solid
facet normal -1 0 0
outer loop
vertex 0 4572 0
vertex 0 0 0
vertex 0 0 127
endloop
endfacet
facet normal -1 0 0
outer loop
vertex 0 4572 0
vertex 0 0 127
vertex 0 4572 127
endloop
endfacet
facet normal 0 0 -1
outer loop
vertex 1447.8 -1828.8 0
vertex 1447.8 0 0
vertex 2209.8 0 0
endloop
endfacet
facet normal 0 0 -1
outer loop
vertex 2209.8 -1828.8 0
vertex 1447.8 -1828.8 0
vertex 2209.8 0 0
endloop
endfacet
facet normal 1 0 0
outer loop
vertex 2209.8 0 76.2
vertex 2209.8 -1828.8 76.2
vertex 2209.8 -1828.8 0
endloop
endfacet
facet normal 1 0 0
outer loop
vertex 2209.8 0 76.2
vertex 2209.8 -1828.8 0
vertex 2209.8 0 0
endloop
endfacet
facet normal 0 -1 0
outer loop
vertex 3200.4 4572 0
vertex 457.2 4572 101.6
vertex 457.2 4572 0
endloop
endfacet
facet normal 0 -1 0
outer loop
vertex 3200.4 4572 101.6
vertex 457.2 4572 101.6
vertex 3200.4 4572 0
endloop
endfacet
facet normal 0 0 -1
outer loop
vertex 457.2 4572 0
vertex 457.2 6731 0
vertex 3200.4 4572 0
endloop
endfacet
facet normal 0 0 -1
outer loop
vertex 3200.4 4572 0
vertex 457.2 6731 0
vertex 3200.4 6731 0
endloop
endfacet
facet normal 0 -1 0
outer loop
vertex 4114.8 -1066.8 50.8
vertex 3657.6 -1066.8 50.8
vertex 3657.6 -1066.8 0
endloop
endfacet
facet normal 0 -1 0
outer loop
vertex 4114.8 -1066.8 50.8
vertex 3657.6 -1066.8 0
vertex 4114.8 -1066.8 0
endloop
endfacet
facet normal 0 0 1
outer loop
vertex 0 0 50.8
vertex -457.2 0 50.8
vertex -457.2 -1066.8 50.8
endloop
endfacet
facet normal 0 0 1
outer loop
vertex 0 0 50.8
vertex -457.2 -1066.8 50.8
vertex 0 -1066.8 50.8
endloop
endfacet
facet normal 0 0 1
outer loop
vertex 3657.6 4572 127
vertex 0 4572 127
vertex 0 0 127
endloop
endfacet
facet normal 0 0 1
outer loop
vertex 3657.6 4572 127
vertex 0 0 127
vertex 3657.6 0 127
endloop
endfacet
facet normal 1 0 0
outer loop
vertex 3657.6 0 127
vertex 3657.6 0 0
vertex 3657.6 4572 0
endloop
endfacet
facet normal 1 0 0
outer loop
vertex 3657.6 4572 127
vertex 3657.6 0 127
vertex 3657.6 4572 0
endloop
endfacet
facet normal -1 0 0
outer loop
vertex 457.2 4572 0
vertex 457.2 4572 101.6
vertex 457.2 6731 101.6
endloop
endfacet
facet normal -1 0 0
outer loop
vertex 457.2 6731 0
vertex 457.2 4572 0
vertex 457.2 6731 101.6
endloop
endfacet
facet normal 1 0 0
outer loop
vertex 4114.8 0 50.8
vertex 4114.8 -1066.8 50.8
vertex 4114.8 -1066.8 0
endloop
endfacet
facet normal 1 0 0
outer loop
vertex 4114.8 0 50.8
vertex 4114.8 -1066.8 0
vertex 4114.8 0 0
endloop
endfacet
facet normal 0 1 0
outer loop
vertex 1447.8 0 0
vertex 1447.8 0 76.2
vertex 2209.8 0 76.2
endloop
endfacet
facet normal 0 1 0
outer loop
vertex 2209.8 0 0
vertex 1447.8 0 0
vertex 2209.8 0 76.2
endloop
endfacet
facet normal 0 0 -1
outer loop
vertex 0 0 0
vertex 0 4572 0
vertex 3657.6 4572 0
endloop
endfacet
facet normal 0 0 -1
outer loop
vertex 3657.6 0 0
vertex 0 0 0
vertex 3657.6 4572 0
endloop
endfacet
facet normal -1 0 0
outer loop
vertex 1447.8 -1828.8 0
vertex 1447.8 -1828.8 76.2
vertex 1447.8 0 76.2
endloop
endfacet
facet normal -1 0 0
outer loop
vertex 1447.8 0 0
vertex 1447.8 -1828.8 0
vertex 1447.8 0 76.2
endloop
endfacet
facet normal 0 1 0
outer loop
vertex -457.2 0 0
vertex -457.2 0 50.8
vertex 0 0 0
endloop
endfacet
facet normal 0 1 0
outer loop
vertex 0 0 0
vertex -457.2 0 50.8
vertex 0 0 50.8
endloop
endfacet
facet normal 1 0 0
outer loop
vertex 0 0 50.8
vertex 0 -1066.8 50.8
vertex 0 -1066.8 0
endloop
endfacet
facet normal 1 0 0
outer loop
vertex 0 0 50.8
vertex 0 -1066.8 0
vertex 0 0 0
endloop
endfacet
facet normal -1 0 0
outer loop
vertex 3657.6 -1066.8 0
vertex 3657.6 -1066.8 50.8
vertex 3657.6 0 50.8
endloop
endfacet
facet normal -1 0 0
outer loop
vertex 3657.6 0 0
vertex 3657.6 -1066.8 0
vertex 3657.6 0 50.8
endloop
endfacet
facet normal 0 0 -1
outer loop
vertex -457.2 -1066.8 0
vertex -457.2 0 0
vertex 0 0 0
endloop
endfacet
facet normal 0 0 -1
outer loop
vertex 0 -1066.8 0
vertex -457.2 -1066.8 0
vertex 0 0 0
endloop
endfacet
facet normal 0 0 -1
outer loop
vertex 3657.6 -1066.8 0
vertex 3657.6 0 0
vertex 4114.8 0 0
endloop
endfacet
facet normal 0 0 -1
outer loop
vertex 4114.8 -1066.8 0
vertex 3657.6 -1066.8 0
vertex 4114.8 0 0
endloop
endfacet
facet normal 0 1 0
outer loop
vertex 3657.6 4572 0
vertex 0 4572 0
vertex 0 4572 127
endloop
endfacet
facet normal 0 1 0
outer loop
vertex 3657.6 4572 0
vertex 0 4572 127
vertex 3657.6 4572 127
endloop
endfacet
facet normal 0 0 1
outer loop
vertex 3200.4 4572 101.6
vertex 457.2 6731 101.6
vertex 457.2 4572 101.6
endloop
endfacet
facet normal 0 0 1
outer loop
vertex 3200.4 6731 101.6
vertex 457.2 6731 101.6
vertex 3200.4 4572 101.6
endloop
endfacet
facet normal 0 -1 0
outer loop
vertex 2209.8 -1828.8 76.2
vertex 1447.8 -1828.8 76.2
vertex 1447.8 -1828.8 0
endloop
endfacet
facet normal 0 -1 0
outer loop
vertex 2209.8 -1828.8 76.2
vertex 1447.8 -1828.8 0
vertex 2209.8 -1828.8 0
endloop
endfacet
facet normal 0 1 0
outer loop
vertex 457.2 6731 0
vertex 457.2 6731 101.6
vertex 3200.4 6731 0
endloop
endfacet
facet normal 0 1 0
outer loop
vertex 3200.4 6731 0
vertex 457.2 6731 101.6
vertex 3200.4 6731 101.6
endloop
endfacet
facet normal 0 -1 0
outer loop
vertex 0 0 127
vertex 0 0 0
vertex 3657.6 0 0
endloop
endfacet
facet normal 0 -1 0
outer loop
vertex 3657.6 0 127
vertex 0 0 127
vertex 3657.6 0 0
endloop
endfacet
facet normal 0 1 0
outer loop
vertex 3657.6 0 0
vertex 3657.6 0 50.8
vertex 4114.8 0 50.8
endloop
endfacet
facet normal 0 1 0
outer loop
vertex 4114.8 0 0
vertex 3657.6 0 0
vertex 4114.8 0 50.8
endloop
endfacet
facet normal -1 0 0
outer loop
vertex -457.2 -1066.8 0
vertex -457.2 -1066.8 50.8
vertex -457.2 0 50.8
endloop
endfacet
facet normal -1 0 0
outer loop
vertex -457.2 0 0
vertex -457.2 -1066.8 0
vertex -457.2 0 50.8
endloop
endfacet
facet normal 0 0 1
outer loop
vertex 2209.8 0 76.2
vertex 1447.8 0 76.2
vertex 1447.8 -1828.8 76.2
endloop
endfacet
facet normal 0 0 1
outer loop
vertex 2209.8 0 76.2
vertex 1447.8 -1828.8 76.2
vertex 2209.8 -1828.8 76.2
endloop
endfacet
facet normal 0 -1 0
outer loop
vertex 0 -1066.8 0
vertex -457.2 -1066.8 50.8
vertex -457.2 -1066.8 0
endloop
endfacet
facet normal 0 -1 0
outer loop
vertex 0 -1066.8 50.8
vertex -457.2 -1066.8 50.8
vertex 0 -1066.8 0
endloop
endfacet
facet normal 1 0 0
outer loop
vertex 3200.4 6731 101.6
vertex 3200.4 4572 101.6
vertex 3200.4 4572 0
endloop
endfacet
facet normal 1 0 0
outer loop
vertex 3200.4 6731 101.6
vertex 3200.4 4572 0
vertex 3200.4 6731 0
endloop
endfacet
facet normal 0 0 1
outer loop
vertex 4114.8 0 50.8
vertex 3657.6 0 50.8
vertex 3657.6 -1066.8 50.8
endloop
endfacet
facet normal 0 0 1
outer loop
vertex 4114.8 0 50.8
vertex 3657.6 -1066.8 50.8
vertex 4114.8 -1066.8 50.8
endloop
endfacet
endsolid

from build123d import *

# Parameters (mm, degrees)
F0_W     = 3657.6
F0_H     = 4572
F1_DEPTH = 127
F3_START = -25.4
F2_W     = 2743.2
F2_H     = 2159
F3_DEPTH = 101.6
F5_START = -50.8
F4_W     = 762
F4_H     = 1828.8
F5_DEPTH = 76.2
F7_START = -76.2
F6_W     = 457.2
F6_H     = 1066.8
F7_DEPTH = 50.8


with BuildPart() as f1:
    # F0 (on Top) → F1 (new body)
    with BuildSketch(Plane.XY):
        with Locations((1828.8, 2286)):
            Rectangle(F0_W, F0_H)
    extrude(amount=F1_DEPTH)


with BuildPart() as f3:
    # F2 (on face) → F3 (new body)
    with BuildSketch(Plane.XY.offset(127).offset(F3_START)):
        with Locations((1828.8, 5651.5)):
            Rectangle(F2_W, F2_H)
    extrude(amount=-F3_DEPTH)


with BuildPart() as f5:
    # F4 (on face) → F5 (new body)
    with BuildSketch(Plane.XY.offset(127).offset(F5_START)):
        with Locations((1828.8, -914.4)):
            Rectangle(F4_W, F4_H)
    extrude(amount=-F5_DEPTH)


with BuildPart() as f7:
    # F6 (on face) → F7 (new body)
    with BuildSketch(Plane.XY.offset(127).offset(F7_START)):
        with Locations((3886.2, -533.4)):
            Rectangle(F6_W, F6_H)
    extrude(amount=-F7_DEPTH)


with BuildPart() as f7b:
    # F6 (on face) → F7, piece 2 (new body)
    with BuildSketch(Plane.XY.offset(127).offset(F7_START)):
        with Locations((-228.6, -533.4)):
            Rectangle(F6_W, F6_H)
    extrude(amount=-F7_DEPTH)


solid = Compound([f1.part, f3.part, f5.part, f7.part, f7b.part])
